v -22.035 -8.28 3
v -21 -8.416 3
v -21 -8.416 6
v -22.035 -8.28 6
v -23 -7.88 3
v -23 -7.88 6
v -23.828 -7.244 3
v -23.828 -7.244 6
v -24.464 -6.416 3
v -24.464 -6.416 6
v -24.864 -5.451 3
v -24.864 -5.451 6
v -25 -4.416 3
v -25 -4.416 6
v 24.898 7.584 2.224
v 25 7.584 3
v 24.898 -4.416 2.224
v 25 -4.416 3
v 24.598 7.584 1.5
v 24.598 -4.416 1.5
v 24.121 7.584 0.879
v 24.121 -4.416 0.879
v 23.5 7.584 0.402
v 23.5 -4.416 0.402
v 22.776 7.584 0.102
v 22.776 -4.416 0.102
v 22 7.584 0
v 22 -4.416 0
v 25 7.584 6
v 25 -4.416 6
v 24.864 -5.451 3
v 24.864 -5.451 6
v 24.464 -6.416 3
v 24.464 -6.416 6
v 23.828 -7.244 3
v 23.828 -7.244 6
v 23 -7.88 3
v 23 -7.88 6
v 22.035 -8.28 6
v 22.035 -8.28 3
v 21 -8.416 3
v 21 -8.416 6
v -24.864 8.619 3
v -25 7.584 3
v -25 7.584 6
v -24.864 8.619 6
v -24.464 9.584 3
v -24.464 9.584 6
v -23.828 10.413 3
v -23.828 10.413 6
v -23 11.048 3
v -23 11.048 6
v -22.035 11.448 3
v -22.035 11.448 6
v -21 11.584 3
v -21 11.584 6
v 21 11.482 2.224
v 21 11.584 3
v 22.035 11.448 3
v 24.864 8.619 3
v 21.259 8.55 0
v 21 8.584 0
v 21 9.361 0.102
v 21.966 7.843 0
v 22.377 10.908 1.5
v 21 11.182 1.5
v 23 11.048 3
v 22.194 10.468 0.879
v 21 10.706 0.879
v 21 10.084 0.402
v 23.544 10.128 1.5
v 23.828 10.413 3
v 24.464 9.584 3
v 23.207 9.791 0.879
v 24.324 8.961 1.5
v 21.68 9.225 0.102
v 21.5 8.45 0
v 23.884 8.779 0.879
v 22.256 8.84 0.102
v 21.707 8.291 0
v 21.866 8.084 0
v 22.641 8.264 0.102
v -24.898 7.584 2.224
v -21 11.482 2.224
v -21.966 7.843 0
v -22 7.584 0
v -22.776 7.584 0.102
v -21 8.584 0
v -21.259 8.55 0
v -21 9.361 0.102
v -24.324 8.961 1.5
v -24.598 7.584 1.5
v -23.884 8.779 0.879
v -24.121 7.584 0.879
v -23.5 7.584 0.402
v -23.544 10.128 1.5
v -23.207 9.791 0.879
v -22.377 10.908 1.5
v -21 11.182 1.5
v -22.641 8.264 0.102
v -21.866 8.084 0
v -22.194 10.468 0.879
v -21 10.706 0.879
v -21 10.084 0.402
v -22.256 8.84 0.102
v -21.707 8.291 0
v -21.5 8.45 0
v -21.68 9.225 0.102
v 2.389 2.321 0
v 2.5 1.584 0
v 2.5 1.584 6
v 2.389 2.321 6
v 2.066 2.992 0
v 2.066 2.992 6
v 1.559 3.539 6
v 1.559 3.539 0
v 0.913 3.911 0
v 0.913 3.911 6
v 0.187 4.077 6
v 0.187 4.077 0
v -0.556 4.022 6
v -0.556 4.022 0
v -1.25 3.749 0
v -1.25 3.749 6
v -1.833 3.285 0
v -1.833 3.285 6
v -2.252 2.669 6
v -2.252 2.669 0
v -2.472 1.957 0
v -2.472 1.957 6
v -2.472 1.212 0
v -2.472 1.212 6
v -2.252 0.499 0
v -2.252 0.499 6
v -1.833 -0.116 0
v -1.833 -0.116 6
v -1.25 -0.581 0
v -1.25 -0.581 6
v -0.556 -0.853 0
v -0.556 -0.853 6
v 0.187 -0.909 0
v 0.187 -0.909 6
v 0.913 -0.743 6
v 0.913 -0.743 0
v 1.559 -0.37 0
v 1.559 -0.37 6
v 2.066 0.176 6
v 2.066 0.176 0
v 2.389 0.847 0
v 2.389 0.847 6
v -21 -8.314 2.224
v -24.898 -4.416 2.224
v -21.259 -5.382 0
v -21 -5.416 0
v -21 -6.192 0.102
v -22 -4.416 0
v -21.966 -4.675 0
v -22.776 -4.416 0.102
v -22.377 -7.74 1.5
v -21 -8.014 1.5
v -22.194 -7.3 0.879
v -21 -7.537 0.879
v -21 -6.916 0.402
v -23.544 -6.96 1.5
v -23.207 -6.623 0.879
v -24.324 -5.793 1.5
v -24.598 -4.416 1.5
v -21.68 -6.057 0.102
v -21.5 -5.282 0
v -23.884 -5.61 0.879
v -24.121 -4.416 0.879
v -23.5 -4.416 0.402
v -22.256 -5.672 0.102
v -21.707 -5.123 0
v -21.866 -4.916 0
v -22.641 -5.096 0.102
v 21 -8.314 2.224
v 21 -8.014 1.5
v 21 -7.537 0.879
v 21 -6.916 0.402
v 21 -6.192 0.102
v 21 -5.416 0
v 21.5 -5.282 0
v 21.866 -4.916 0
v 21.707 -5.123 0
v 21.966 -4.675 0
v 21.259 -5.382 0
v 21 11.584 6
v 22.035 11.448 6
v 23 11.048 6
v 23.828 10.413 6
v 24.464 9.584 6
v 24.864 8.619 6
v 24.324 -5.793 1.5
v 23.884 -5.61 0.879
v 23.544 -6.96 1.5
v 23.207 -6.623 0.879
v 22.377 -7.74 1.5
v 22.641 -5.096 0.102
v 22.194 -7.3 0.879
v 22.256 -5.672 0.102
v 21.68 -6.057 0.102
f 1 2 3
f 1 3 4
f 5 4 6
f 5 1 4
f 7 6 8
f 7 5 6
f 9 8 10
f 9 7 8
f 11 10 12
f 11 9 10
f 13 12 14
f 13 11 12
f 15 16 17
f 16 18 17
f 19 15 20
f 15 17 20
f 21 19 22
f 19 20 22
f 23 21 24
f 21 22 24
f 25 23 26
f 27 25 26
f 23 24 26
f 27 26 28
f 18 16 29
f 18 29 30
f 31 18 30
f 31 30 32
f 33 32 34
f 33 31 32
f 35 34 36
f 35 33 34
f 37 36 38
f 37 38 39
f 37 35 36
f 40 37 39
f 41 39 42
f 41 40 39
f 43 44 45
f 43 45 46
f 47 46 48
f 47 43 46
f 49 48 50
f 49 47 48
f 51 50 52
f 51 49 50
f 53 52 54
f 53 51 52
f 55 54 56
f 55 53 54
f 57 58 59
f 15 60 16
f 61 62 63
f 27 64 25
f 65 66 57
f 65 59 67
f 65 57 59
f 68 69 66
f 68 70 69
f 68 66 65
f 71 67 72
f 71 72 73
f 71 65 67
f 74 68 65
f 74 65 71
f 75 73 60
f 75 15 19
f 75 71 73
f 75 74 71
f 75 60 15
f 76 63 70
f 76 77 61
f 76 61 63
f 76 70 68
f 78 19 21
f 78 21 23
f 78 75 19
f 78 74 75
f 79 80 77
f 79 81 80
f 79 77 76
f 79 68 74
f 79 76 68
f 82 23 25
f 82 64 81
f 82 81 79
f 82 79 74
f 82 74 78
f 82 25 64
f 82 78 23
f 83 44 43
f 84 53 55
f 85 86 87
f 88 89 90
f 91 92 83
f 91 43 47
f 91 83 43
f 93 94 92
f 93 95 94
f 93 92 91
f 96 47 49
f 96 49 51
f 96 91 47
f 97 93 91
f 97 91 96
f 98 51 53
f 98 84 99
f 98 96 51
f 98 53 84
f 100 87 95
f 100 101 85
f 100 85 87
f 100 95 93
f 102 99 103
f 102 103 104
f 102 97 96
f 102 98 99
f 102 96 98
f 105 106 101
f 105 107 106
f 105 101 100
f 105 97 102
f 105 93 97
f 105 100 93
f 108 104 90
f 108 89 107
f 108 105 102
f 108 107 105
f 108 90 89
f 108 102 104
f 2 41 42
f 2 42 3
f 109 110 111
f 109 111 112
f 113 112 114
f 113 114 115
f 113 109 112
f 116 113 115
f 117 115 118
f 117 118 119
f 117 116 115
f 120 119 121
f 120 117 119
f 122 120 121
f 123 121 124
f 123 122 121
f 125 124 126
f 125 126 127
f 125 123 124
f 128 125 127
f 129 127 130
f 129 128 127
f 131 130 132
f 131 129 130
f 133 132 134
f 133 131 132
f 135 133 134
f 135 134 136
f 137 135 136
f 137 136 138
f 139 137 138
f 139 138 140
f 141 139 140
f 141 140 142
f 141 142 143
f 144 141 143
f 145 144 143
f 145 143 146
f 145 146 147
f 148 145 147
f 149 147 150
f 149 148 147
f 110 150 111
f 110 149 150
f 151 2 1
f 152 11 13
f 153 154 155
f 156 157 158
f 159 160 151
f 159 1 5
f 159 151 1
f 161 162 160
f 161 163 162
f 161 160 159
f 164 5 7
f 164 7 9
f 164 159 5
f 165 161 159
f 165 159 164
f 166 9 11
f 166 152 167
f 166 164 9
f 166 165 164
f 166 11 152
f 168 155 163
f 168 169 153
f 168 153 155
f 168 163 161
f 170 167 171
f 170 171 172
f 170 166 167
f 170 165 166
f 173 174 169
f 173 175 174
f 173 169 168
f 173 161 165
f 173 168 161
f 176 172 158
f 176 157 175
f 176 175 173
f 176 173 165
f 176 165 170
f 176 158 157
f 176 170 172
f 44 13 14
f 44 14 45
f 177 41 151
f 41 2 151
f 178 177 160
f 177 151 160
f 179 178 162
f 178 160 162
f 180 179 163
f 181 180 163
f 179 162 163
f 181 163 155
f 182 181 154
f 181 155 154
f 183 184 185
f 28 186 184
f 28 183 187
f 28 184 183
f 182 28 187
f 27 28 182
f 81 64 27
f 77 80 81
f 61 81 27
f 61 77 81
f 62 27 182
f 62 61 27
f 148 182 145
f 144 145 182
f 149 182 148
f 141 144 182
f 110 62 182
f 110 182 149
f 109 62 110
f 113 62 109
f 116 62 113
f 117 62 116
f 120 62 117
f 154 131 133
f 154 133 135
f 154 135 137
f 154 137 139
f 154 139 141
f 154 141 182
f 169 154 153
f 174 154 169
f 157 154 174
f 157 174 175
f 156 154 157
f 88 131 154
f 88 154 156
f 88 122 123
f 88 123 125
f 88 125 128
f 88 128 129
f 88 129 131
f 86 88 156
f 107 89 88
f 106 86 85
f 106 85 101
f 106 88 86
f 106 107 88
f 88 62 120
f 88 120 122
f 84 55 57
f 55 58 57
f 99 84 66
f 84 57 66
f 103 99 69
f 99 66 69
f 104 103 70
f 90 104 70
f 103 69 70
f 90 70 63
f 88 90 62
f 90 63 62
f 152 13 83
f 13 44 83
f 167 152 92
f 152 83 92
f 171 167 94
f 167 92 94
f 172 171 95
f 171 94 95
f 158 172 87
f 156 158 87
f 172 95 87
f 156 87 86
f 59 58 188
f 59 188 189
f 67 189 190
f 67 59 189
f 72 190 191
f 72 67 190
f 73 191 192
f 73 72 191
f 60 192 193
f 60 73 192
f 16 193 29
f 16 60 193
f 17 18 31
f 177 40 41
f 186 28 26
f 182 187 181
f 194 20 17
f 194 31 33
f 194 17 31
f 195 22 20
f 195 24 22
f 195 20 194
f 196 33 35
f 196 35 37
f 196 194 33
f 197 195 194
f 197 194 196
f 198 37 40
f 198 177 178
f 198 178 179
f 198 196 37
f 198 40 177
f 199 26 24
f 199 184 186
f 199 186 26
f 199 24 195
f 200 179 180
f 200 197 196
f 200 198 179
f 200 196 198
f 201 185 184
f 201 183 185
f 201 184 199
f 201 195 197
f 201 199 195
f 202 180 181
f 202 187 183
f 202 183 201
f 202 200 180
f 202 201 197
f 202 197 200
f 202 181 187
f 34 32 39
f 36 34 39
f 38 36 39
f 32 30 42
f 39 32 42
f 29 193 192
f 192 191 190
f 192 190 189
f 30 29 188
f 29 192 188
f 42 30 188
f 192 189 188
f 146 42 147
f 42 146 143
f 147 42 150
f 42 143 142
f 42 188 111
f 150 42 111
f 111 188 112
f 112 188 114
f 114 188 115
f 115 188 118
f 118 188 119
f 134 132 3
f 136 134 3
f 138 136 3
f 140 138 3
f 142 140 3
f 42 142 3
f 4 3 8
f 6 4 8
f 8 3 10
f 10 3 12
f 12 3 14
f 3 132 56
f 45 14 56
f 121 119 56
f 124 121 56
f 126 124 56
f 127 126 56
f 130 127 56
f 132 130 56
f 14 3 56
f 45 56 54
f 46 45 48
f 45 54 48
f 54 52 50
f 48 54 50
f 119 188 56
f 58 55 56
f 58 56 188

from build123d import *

# Parameters (mm, degrees)
SKETCH1_R           = 2.5
BOSS_EXTRUDE1_DEPTH = 6
FILLET1_R           = 3


with BuildPart() as part:
    # Sketch1 → Boss-Extrude1 (new body)
    with BuildSketch(Plane.XY):
        with BuildLine():
            Line((-21, 11.584180911), (21, 11.584180911))
            ThreePointArc((21, 11.584180911), (23.828427125, 10.412608036), (25, 7.584180911))
            Line((25, 7.584180911), (25, -4.415819089))
            ThreePointArc((25, -4.415819089), (23.828427125, -7.244246214), (21, -8.415819089))
            Line((21, -8.415819089), (-21, -8.415819089))
            ThreePointArc((-21, -8.415819089), (-23.828427125, -7.244246214), (-25, -4.415819089))
            Line((-25, -4.415819089), (-25, 7.584180911))
            ThreePointArc((-25, 7.584180911), (-23.828427125, 10.412608036), (-21, 11.584180911))
        make_face()
        with Locations((0, 1.584180911)):
            Circle(SKETCH1_R, mode=Mode.SUBTRACT)
    extrude(amount=BOSS_EXTRUDE1_DEPTH)

    # Fillet1
    fillet1_edges = [part.edges().sort_by_distance(p)[0] for p in [
        (-25, 1.584180911, 0),
        (-23.828427125, 10.412608036, 0),
        (0, 11.584180911, 0),
        (23.828427125, 10.412608036, 0),
        (25, 1.584180911, 0),
        (23.828427125, -7.244246214, 0),
        (0, -8.415819089, 0),
        (-23.828427125, -7.244246214, 0),
    ]]
    fillet(fillet1_edges, radius=FILLET1_R)


solid = part.part
